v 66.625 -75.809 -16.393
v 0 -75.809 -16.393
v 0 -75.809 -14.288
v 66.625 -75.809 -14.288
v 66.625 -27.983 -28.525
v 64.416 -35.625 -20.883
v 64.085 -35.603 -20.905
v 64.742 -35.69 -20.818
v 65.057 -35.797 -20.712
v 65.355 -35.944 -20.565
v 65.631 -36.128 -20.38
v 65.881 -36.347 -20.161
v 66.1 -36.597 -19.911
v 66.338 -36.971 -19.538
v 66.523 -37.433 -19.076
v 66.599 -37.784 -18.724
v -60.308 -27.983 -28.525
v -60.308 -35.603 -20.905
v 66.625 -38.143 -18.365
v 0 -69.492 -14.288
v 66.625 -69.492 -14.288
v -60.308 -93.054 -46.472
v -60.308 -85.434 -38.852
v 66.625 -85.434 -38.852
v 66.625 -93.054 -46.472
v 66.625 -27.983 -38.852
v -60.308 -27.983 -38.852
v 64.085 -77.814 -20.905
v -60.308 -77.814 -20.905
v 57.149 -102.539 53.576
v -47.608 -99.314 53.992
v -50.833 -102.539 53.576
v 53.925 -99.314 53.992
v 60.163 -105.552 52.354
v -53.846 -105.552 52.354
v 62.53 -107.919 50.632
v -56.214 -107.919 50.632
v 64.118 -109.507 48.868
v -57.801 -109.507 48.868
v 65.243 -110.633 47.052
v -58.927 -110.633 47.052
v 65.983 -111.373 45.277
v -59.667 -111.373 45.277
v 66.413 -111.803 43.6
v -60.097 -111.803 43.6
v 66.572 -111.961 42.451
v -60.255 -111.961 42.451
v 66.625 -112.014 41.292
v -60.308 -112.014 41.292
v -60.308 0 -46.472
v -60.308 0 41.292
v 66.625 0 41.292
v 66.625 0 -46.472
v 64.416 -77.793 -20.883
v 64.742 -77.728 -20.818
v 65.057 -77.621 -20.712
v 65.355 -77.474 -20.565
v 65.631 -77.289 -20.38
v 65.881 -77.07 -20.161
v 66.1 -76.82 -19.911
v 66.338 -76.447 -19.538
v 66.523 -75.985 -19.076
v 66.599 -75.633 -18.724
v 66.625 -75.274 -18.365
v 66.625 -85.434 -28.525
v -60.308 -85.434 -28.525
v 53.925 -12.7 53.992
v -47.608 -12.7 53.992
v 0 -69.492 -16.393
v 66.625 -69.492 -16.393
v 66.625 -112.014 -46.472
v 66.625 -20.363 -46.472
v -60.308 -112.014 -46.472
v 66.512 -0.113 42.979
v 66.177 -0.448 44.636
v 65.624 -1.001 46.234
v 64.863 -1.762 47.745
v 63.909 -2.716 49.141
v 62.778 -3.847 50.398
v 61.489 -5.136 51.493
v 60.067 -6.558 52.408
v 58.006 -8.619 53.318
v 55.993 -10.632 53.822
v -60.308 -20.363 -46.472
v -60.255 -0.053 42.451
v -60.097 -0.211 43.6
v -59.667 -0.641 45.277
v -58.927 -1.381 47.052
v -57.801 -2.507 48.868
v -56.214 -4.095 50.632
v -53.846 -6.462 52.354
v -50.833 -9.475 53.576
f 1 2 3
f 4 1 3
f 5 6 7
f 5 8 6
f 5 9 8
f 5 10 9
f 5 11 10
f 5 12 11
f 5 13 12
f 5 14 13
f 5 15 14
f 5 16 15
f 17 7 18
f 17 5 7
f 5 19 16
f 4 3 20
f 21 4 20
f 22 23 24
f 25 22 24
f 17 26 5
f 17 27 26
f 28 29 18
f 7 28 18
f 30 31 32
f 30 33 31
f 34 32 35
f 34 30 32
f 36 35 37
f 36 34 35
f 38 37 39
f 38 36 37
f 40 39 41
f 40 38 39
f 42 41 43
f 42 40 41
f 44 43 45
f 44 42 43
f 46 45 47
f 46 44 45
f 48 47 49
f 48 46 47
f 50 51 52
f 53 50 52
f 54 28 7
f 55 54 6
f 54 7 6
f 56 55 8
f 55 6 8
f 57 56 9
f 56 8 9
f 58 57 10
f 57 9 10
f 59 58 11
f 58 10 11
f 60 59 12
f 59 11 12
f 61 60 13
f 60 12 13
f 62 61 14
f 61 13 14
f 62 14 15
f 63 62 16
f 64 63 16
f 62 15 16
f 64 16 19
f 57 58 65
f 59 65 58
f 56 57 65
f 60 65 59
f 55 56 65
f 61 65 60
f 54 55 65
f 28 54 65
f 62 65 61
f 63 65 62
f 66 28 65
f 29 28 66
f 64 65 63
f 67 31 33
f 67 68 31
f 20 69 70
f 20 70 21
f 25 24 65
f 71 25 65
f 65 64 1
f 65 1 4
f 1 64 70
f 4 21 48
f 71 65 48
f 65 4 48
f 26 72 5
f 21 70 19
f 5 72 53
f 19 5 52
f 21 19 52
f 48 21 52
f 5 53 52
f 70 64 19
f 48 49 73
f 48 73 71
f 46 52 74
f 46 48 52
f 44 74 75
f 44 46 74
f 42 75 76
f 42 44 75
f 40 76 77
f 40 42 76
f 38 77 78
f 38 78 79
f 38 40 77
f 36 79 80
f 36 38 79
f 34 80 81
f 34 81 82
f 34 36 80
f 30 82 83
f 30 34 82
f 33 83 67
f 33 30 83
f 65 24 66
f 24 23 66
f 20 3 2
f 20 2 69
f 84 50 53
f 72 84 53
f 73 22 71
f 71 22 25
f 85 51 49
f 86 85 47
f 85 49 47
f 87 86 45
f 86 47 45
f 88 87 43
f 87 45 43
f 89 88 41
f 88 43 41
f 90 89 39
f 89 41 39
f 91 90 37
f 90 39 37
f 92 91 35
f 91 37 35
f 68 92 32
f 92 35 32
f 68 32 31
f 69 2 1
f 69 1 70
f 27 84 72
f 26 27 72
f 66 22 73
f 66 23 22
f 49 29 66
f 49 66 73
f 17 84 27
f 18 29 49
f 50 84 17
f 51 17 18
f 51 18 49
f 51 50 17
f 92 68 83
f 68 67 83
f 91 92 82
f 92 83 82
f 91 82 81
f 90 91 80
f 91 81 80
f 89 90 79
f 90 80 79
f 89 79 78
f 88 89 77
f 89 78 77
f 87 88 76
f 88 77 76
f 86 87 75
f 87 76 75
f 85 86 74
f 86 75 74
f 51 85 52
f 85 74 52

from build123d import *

# Parameters (mm, degrees)
F0_W      = 126.9331611693
F0_H      = 100.463680923
F1_DEPTH  = 112.014
F2_R      = 12.7
F3_W      = 57.4507880956
F3_H      = 35.7939470559
F4_DEPTH  = 166.37
F5_DEPTH  = 99.822
F8_SIZE   = 7.62
F9_W      = 6.3165798783
F9_H      = 2.1055256948
F10_DEPTH = 148.844
F11_R     = 2.54


with BuildPart() as f1:
    # F0 (on Front) → F1 (new body)
    with BuildSketch(Plane.XZ):
        with Locations((3.1582918018, 3.759868443)):
            Rectangle(F0_W, F0_H)
    extrude(amount=F1_DEPTH)

    # F2
    f2_edges = [f1.edges().sort_by_distance(p)[0] for p in [
        (3.158292, -112.014, 53.991709),
        (66.624872, -56.007, 53.991709),
        (3.158292, 0, 53.991709),
        (-60.308289, -56.007, 53.991709),
    ]]
    fillet(f2_edges, radius=F2_R)


with BuildPart() as f4:
    # F3 (on Right) → F4 (new body)
    with BuildSketch(Plane.YZ):
        with Locations((-56.7088415846, -38.8018405065)):
            Rectangle(F3_W, F3_H)
    extrude(amount=F4_DEPTH)

    # F5 (add): a face of the model
    f5_faces = [f4.faces().sort_by_distance(p)[0] for p in [
        (166.37, -56.7088415846, -38.8018405065),
    ]]
    extrude(f5_faces, amount=F5_DEPTH)


with BuildPart() as f4_1:
    # F6: moved
    add(f4.part.moved(Location((-151.384, 0, 0))))


with BuildPart() as f1_1:
    add(f1.part)

    # F7: cut F4
    add(f4_1.part, mode=Mode.SUBTRACT)

    # F8
    f8_edges = [f1_1.edges().sort_by_distance(p)[0] for p in [
        (3.158292, -85.434236, -46.471972),
        (3.158292, -27.983448, -46.471972),
        (3.158292, -27.983448, -20.904867),
        (3.158292, -85.434236, -20.904867),
    ]]
    chamfer(f8_edges, length=F8_SIZE)

    # F9 (on Right) → F10 (cut)
    with BuildSketch(Plane.YZ):
        with Locations((-72.6506821811, -15.3402634896)):
            Rectangle(F9_W, F9_H)
    extrude(amount=F10_DEPTH, mode=Mode.SUBTRACT)

    # F11
    f11_edges = [f1_1.edges().sort_by_distance(p)[0] for p in [
        (66.624872, -56.708842, -20.904867),
    ]]
    fillet(f11_edges, radius=F11_R)


solid = f1_1.part
